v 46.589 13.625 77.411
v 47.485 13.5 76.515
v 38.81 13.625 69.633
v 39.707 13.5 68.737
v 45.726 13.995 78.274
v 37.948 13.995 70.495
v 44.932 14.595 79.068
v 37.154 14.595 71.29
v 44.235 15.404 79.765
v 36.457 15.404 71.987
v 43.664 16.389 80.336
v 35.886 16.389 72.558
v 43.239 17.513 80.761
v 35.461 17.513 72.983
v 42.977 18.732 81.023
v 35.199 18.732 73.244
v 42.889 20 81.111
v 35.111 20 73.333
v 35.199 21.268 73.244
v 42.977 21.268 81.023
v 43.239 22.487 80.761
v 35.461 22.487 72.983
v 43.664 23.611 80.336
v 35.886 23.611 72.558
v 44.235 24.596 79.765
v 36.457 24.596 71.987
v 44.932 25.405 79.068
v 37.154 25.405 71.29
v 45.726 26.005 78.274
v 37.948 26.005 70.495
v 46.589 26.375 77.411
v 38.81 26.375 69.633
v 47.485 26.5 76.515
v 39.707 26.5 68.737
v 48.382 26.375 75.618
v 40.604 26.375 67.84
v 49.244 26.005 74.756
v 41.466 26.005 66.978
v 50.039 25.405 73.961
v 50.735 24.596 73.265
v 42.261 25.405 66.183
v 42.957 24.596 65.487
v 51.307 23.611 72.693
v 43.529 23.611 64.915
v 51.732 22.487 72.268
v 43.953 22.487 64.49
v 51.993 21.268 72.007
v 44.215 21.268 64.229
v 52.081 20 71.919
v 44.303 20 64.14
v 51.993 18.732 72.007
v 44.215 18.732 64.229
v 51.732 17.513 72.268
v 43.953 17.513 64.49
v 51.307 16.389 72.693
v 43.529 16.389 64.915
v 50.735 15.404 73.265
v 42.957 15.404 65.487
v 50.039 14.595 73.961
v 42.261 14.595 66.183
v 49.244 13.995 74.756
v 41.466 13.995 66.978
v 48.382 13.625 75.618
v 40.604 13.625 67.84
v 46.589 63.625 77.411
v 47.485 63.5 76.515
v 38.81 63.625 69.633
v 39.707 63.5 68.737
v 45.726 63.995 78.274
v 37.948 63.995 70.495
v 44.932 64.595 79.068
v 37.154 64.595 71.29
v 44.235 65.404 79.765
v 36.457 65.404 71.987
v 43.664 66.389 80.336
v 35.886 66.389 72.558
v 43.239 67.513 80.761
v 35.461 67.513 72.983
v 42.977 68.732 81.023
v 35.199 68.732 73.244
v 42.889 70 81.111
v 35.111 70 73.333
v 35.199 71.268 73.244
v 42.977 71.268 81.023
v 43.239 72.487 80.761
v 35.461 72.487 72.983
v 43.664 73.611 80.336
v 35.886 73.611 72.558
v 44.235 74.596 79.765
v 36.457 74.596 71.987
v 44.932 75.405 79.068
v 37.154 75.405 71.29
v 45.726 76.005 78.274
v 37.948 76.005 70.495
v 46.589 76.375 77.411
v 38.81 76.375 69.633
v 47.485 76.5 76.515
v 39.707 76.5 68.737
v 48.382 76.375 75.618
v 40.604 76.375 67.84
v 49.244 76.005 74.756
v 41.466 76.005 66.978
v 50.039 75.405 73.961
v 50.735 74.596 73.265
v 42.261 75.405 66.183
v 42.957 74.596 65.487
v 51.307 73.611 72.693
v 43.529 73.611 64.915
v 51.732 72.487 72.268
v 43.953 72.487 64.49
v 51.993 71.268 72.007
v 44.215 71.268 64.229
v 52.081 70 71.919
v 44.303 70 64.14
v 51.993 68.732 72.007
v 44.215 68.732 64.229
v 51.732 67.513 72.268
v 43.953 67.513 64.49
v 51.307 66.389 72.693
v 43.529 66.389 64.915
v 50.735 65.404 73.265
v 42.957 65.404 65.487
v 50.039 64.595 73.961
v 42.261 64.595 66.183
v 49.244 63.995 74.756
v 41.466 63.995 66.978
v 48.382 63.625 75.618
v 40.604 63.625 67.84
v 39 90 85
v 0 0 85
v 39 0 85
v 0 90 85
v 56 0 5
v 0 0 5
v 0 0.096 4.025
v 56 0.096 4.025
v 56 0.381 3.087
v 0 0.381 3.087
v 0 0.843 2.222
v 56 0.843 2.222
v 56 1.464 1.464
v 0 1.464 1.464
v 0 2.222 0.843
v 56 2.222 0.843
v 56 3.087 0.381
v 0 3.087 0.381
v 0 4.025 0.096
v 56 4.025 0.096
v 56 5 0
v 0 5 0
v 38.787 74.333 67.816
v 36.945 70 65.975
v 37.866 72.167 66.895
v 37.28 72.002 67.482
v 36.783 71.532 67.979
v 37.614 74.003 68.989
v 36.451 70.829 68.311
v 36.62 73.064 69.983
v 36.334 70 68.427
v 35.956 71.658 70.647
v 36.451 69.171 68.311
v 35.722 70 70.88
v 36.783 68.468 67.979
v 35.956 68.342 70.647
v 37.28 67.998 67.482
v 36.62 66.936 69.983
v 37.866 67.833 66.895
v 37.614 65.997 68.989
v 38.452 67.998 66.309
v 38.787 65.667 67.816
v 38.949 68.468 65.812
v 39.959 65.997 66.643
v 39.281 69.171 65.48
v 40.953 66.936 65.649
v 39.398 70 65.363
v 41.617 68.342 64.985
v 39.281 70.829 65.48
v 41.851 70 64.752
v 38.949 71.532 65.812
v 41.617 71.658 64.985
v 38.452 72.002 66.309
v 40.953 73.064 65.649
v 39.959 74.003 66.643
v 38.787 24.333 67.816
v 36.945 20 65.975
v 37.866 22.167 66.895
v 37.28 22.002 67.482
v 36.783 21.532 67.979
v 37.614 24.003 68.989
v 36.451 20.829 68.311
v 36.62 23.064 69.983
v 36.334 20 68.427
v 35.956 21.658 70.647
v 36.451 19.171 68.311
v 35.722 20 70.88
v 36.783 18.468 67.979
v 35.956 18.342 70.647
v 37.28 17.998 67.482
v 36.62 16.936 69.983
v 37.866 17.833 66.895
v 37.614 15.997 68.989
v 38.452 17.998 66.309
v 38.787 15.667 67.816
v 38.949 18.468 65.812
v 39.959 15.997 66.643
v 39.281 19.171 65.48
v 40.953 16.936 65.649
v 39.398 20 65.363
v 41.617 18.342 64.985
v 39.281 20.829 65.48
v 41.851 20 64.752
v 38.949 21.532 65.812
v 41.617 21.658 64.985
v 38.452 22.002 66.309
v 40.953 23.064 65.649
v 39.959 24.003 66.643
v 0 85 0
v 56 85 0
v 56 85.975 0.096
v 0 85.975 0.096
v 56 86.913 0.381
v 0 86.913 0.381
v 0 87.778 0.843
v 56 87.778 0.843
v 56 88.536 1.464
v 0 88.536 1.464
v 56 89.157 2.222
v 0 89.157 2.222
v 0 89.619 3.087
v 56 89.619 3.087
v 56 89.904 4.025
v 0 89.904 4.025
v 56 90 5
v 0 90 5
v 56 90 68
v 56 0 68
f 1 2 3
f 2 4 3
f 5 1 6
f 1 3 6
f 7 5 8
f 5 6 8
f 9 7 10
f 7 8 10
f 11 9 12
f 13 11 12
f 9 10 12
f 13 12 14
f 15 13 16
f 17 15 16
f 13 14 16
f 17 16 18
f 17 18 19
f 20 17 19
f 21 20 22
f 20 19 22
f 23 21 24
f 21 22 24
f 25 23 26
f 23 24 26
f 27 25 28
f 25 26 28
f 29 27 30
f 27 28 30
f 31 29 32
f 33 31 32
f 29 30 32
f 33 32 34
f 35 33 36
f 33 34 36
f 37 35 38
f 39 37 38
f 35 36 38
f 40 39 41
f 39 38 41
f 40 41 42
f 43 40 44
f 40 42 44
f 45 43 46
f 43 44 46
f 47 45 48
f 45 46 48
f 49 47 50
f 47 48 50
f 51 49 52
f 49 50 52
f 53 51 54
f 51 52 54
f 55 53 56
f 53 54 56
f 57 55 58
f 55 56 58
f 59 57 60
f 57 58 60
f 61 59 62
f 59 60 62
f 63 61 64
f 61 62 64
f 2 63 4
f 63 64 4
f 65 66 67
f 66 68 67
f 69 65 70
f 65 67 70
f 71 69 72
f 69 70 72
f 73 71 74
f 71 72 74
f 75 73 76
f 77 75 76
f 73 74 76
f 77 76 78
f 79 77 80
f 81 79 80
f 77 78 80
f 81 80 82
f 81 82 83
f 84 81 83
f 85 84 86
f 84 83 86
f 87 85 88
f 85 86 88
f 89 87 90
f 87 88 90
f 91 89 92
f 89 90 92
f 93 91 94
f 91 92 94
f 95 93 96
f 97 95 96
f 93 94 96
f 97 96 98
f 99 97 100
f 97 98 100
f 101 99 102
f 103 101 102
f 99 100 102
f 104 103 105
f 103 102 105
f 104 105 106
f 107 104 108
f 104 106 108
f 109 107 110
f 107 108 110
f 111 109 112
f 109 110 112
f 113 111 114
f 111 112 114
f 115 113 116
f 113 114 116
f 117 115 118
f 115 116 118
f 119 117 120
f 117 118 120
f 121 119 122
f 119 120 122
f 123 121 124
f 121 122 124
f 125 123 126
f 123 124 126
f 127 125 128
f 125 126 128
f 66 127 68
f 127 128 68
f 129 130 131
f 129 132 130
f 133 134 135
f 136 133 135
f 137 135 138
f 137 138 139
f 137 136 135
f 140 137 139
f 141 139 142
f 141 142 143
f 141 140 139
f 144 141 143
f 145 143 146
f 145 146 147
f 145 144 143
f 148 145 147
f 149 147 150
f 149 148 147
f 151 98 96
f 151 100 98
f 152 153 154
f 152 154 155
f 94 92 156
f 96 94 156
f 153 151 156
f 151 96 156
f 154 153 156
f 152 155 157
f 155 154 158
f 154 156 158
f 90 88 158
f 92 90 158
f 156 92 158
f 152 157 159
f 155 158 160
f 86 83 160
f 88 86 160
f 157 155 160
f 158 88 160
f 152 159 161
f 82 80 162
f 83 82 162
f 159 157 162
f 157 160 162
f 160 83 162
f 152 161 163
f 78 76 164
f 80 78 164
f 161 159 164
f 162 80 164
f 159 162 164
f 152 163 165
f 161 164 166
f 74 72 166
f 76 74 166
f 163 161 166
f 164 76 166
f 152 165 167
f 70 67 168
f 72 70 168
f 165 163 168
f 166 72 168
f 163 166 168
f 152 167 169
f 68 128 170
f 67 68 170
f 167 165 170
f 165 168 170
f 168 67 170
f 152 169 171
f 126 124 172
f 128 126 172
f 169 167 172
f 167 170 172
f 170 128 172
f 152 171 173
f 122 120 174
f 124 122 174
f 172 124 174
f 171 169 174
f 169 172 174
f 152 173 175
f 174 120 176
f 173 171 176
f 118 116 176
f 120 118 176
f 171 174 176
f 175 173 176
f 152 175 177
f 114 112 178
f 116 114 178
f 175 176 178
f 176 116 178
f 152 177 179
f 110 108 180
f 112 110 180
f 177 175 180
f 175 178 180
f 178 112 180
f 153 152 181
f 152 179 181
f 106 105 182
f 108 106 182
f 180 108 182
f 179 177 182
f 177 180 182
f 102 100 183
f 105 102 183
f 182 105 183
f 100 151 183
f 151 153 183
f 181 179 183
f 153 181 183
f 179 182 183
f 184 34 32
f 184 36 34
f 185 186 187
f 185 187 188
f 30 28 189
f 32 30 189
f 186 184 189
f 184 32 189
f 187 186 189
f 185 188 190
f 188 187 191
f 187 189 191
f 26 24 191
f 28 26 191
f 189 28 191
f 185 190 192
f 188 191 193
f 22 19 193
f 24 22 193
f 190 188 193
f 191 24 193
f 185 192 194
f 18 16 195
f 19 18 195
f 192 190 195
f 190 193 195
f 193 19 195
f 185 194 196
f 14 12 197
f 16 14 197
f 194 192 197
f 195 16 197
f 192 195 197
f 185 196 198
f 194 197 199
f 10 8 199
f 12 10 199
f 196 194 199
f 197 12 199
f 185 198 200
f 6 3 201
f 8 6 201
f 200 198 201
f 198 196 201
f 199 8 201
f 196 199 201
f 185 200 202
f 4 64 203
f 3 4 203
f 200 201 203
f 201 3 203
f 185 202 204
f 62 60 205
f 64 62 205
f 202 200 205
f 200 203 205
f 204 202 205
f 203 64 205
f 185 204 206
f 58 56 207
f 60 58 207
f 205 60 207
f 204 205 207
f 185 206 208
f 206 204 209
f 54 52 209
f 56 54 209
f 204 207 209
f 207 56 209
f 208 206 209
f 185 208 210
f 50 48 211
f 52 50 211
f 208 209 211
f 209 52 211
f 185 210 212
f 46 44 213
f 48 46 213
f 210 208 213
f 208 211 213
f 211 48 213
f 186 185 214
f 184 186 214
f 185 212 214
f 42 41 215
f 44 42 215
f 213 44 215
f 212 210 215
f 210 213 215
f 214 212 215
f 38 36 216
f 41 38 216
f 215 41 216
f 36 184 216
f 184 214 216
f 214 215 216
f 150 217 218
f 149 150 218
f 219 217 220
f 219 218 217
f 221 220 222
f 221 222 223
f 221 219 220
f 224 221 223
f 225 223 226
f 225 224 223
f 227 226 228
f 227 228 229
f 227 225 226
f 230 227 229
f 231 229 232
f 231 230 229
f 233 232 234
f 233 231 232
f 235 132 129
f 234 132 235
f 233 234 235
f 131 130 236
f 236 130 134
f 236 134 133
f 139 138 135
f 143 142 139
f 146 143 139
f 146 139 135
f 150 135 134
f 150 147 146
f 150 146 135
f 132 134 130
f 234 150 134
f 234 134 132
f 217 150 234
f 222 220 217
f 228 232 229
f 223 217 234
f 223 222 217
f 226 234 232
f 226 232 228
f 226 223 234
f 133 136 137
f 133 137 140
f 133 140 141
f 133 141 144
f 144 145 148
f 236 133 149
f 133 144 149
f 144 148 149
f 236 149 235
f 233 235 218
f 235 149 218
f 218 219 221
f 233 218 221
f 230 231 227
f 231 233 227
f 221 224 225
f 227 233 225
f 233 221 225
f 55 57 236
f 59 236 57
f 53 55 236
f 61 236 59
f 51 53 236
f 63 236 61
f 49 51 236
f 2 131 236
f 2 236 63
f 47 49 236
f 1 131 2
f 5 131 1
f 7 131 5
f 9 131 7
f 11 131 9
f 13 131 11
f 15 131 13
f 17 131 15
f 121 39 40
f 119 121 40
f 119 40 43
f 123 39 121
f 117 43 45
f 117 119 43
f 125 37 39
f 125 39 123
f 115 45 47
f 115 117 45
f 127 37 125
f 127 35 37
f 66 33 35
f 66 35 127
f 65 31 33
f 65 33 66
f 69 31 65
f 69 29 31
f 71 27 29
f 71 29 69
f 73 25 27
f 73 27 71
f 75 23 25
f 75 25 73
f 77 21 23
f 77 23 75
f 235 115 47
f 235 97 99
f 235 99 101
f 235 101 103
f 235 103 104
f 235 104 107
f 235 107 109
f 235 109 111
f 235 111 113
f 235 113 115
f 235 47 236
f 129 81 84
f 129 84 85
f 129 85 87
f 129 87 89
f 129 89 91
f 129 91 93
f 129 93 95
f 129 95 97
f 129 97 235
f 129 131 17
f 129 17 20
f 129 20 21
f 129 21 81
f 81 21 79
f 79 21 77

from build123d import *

# Parameters (mm, degrees)
F0_W     = 56
F0_H     = 90
F1_DEPTH = 25
F2_DEPTH = 60
F3_SIZE  = 17
F5_D     = 13
F5_DEPTH = 11
F5_TIP   = 3.9055940237
F6_R     = 5


with BuildPart() as f1:
    # F0 (on Top) → F1 (new body)
    with BuildSketch(Plane.XY):
        with Locations((28, 45)):
            Rectangle(F0_W, F0_H)
    extrude(amount=F1_DEPTH)

    # F2 (add): a face of the model
    f2_faces = [f1.faces().sort_by_distance(p)[0] for p in [
        (28, 45, 25),
    ]]
    extrude(f2_faces, amount=F2_DEPTH)

    # F3
    f3_edges = [f1.edges().sort_by_distance(p)[0] for p in [
        (56, 45, 85),
    ]]
    chamfer(f3_edges, length=F3_SIZE)

    # F5
    with Locations(Plane(origin=(62, 0, 62), x_dir=(0, 1, 0), z_dir=(0.7071067812, 0, 0.7071067812))):
        with Locations((20, 20.5269119346), (70, 20.5269119346)):
            Hole(F5_D / 2, depth=F5_DEPTH)
            with Locations((0, 0, -(F5_DEPTH + F5_TIP / 2))):  # 118° drill point
                Cone(0, F5_D / 2, F5_TIP, mode=Mode.SUBTRACT)

    # F6
    f6_edges = [f1.edges().sort_by_distance(p)[0] for p in [
        (28, 0, 0),
        (28, 90, 0),
    ]]
    fillet(f6_edges, radius=F6_R)


solid = f1.part
